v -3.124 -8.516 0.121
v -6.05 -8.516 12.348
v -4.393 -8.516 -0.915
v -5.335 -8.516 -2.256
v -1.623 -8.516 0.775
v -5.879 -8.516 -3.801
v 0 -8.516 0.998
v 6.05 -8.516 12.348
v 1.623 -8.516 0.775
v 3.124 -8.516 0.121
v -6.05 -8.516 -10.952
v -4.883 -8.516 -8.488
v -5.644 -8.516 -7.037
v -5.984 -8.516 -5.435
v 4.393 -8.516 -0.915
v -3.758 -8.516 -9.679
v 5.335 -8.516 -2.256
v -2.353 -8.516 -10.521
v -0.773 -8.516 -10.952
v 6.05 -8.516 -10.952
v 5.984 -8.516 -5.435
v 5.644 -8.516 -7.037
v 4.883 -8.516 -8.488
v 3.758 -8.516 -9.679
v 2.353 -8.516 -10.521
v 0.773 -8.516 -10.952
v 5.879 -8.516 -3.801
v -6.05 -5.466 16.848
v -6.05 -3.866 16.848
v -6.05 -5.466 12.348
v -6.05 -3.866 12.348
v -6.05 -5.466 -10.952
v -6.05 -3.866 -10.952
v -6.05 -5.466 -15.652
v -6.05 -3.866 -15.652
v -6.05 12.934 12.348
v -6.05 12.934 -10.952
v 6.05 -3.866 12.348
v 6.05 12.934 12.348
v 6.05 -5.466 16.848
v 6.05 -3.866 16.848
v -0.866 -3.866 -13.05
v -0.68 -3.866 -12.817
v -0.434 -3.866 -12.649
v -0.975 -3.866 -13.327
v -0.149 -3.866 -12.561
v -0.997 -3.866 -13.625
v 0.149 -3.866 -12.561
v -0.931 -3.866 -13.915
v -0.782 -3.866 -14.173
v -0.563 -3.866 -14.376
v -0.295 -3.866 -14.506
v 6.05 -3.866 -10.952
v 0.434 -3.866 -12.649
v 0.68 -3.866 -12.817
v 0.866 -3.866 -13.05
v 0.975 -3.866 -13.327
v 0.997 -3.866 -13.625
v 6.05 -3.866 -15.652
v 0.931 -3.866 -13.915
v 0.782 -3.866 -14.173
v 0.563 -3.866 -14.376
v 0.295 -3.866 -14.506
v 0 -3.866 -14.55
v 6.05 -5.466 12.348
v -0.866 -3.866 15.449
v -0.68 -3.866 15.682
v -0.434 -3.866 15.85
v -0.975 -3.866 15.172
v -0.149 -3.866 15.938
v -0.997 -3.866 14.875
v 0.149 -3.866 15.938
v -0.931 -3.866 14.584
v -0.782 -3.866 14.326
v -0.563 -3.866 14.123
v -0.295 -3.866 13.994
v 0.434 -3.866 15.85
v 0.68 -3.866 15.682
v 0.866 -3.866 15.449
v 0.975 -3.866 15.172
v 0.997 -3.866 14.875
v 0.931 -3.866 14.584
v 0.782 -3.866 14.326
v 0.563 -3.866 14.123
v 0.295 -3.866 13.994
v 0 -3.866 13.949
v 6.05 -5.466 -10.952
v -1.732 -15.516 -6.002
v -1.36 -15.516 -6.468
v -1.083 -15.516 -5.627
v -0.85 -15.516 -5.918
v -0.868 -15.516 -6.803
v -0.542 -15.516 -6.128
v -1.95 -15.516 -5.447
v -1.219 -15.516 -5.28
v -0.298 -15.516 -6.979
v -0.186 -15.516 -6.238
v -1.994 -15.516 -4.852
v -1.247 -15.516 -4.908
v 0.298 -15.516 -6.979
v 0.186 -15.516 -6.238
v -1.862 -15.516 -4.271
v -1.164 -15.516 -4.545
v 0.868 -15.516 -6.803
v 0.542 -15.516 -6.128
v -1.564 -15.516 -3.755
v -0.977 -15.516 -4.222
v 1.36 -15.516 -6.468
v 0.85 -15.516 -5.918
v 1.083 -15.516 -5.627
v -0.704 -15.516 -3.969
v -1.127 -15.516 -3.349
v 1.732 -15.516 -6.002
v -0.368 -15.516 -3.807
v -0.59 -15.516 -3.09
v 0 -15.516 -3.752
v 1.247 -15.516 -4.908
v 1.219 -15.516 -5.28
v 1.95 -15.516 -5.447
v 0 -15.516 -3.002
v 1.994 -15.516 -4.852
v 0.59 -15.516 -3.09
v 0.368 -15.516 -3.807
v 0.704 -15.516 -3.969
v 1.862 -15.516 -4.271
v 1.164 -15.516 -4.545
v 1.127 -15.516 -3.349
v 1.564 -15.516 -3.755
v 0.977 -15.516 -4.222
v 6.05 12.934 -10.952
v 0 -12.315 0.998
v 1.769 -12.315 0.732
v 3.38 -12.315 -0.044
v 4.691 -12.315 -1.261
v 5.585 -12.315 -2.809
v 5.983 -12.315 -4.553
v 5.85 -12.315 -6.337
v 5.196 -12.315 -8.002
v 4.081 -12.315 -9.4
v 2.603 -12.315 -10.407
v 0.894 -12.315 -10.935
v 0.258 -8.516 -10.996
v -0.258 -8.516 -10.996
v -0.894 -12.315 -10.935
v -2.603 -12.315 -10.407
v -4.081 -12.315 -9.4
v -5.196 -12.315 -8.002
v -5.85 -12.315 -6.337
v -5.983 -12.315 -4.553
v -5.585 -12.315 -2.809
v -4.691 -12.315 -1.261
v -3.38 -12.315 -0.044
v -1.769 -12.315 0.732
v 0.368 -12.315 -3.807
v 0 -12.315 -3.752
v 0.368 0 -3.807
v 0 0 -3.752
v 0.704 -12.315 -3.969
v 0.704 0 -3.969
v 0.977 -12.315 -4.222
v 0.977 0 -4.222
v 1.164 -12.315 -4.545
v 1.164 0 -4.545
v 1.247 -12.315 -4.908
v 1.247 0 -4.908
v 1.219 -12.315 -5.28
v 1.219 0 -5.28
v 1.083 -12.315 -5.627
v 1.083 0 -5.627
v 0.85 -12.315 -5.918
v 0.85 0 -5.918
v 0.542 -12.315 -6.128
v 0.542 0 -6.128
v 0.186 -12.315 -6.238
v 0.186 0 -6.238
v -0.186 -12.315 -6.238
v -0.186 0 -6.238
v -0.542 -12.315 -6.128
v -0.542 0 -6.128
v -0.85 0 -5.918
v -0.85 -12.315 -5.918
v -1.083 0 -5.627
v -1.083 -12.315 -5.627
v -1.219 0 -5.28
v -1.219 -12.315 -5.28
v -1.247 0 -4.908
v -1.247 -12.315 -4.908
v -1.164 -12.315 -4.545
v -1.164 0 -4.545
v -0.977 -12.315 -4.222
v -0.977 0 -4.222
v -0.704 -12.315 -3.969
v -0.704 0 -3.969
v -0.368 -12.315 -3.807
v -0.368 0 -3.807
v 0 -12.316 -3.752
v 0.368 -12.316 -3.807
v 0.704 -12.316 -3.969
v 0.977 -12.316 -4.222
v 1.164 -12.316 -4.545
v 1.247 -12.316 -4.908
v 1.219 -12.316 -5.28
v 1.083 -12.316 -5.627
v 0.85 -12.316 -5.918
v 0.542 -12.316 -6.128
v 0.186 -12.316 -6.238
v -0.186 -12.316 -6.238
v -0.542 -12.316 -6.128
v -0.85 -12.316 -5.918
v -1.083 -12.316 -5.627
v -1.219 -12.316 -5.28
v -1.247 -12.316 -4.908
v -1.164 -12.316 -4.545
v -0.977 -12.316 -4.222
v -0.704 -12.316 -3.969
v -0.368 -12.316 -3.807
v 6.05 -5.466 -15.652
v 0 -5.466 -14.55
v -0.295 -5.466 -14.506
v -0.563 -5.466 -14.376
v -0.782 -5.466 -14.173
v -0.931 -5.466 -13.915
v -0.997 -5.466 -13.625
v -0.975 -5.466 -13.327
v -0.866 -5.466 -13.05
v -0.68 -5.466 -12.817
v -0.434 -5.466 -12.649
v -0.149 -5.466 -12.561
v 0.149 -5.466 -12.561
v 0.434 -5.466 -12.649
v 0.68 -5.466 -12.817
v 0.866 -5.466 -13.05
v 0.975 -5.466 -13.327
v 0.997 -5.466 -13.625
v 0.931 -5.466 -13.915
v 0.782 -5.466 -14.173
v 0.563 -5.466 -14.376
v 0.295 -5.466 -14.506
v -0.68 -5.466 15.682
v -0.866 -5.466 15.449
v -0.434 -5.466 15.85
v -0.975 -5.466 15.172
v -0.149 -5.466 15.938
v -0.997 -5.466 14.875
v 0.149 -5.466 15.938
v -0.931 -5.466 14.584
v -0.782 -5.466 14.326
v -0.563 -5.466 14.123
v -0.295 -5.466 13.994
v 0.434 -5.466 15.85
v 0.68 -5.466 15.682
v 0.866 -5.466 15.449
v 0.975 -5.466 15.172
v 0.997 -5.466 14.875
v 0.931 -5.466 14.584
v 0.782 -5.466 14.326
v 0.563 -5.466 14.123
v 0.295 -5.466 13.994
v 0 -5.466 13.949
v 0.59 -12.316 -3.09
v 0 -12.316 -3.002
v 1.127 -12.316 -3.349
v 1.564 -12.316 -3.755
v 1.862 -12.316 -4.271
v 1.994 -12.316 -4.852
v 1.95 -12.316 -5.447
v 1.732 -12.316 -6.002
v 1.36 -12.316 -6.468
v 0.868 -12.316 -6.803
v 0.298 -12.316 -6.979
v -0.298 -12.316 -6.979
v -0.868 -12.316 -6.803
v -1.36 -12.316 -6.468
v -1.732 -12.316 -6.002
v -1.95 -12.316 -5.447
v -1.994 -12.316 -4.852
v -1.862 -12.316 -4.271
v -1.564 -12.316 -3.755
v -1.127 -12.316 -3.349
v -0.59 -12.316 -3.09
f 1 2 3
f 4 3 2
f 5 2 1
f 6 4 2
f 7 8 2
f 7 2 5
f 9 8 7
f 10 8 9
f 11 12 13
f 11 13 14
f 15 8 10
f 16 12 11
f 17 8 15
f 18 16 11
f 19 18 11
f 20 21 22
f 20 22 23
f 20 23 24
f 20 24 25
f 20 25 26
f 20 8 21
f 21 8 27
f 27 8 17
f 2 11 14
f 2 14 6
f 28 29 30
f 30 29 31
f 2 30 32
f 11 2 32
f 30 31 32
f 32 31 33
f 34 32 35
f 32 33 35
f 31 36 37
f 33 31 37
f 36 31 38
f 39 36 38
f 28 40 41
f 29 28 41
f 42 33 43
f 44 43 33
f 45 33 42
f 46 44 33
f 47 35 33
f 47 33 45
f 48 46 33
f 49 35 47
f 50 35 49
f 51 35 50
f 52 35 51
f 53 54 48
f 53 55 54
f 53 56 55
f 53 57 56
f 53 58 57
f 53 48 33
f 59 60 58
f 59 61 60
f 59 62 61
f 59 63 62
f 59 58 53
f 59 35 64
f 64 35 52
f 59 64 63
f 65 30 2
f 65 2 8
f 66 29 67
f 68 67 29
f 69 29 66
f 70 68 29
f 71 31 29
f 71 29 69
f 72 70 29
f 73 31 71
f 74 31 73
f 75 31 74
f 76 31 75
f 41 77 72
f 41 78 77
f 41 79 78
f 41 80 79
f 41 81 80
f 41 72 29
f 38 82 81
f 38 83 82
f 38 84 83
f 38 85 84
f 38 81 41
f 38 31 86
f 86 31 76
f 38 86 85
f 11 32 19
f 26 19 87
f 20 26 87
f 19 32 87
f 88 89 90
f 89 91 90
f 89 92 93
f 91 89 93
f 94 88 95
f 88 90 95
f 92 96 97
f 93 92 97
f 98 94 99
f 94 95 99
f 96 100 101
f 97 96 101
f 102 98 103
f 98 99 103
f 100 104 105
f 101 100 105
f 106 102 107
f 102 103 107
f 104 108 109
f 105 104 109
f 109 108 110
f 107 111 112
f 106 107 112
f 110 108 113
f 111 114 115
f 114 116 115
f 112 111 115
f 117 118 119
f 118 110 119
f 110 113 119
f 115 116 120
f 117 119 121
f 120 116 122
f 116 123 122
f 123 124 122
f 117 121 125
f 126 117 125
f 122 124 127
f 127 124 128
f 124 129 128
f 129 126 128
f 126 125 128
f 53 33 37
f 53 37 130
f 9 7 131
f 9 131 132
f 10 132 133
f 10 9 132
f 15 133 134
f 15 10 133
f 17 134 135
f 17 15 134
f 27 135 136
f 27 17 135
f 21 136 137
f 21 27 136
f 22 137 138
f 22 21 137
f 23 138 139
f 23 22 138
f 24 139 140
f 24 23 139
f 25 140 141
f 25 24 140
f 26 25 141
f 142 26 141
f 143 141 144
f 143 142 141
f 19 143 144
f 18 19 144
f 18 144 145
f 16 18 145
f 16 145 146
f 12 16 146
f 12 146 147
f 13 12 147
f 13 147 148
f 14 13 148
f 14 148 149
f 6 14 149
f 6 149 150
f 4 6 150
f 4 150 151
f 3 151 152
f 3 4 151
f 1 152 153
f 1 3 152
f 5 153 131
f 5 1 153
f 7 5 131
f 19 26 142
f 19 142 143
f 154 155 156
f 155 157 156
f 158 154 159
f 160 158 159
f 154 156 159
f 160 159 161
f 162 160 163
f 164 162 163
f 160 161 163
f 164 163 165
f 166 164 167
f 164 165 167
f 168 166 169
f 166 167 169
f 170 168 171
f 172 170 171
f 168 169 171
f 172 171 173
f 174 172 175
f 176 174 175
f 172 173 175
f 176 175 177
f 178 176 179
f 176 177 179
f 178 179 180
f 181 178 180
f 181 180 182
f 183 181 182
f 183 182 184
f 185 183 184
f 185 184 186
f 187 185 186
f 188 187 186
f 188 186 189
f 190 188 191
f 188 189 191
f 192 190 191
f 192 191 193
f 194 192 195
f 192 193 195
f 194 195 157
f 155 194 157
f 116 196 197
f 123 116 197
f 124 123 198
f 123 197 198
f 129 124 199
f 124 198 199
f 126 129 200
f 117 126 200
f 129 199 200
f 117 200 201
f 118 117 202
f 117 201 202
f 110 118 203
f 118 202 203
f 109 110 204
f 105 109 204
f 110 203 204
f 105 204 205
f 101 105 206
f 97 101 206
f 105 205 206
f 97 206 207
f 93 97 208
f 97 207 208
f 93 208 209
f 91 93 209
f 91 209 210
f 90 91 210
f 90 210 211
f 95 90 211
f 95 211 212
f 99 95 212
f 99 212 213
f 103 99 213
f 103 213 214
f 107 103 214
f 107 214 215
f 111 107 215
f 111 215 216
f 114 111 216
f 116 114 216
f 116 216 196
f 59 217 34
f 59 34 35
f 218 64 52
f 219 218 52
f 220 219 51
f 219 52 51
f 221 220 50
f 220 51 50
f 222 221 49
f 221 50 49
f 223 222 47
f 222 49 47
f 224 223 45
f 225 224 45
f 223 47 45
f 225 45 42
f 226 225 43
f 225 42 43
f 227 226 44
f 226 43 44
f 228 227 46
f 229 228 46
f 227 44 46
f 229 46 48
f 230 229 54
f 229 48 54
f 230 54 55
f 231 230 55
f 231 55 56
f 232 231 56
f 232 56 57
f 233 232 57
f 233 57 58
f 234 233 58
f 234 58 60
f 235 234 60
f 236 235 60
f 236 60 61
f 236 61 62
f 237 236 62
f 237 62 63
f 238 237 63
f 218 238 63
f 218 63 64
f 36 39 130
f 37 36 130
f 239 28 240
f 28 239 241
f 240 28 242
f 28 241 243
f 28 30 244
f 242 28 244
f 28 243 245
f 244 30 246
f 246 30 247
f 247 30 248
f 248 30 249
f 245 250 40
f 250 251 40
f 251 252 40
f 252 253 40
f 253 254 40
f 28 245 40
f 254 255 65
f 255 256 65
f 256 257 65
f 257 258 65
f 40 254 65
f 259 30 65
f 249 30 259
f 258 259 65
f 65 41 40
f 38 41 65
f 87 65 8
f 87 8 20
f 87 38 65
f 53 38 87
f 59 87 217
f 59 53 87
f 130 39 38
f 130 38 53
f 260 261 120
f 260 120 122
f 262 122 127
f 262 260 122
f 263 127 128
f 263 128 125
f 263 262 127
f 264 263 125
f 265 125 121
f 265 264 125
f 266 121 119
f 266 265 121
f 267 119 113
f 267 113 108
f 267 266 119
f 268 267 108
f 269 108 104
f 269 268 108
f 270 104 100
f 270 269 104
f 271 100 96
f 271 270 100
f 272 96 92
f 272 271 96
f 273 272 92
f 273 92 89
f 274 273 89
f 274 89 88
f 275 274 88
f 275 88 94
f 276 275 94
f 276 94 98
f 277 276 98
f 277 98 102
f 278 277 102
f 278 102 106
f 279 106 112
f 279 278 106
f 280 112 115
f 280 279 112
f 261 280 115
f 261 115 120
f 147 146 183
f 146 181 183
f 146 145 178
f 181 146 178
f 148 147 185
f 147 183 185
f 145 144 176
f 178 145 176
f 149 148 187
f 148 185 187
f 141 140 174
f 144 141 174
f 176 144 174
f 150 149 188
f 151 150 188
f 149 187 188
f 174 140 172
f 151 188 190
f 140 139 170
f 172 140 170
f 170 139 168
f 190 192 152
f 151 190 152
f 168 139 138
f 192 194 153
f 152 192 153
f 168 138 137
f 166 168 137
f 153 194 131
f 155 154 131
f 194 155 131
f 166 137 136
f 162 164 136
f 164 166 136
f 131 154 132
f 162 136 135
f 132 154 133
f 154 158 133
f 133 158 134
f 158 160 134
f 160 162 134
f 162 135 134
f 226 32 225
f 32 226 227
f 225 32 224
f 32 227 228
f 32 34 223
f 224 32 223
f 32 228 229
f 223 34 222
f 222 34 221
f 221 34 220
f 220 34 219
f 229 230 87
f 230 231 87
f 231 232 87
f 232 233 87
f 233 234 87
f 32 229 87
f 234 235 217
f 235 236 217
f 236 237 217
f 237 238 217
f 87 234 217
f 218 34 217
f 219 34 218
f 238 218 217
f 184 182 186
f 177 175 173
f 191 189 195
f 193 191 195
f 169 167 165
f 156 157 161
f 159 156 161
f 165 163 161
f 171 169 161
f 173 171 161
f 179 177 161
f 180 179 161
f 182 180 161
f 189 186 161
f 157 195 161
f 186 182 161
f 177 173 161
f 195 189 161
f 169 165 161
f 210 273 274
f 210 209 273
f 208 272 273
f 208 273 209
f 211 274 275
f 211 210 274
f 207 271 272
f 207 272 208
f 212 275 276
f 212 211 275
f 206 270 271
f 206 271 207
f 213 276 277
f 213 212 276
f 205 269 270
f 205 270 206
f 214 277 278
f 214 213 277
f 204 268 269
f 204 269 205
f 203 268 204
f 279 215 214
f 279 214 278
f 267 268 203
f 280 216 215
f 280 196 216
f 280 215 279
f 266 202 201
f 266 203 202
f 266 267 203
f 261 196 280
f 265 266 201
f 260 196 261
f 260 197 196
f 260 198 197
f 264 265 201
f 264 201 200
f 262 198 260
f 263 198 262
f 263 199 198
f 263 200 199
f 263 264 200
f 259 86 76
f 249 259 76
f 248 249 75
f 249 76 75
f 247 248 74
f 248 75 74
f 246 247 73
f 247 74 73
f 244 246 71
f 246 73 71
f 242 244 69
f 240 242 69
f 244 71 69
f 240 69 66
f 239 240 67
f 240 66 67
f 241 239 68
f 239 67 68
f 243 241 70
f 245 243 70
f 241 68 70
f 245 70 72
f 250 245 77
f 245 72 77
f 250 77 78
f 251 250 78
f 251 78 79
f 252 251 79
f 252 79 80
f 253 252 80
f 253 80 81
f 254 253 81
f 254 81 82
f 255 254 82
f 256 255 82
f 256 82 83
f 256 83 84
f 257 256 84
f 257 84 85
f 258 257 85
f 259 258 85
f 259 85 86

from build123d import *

# Parameters (mm, degrees)
SKETCH_3_W          = 32.5
SKETCH_3_H          = 21.45
EXTRUDE_1_DEPTH     = 6.05
CUT_EXTRUDE_START   = -3.86581
SKETCH_4_W          = 12.1
SKETCH_4_H          = 4.7
SKETCH_4_H_2        = 4.6
CUT_EXTRUDE_1_DEPTH = 26.951221363
CUT_EXTRUDE_START_2 = -5.46581
SKETCH_4_2_W        = 12.1
SKETCH_4_2_H        = 4.7
SKETCH_4_2_H_2      = 4.6
CUT_EXTRUDE_2_DEPTH = 17.619601363
SKETCH_5_R          = 1
CUT_EXTRUDE_3_DEPTH = 23.085411363
EXTRUDE_START       = -8.5159
SKETCH_6_R          = 6.000000077
SKETCH_6_R_2        = 1.25
EXTRUDE_2_DEPTH     = 3.7991
EXTRUDE_START_2     = -12.3159
SKETCH_6_6_R        = 1.999999968
EXTRUDE_3_DEPTH     = 3.2
SKETCH_6_7_R        = 1.25
CUT_EXTRUDE_4_DEPTH = 24.690031766


with BuildPart() as part:
    # 草图3 → 凸台-拉伸1 (new, symmetric)
    with BuildSketch(Plane(origin=(0, 0, 0), x_dir=(0, 0, -1), z_dir=(1, 0, 0))):
        with Locations((-0.5985, 2.2091)):
            Rectangle(SKETCH_3_W, SKETCH_3_H)
    extrude(amount=EXTRUDE_1_DEPTH, both=True)

    # 草图4 → 切除-拉伸1 (cut, through all)
    with BuildSketch(Plane(origin=(0, 0, 0), x_dir=(1, 0, 0), z_dir=(0, 1, 0)).offset(CUT_EXTRUDE_START)):
        with Locations((0, 13.30155)):
            Rectangle(SKETCH_4_W, SKETCH_4_H)
        with Locations((0, -14.6484)):
            Rectangle(SKETCH_4_W, SKETCH_4_H_2)
    extrude(amount=CUT_EXTRUDE_1_DEPTH, mode=Mode.SUBTRACT)

    # 草图4<2> → 切除-拉伸2 (cut, through all)
    with BuildSketch(Plane(origin=(0, 0, 0), x_dir=(1, 0, 0), z_dir=(0, 1, 0)).offset(CUT_EXTRUDE_START_2)):
        with Locations((0, 13.30155)):
            Rectangle(SKETCH_4_2_W, SKETCH_4_2_H)
        with Locations((0, -14.6484)):
            Rectangle(SKETCH_4_2_W, SKETCH_4_2_H_2)
    extrude(amount=-CUT_EXTRUDE_2_DEPTH, mode=Mode.SUBTRACT)

    # 草图5 → 切除-拉伸3 (cut, through all)
    with BuildSketch(Plane(origin=(0, 0, 0), x_dir=(1, 0, 0), z_dir=(0, 1, 0))):
        with Locations((0, 13.55)):
            Circle(SKETCH_5_R)
        with Locations((0, -14.949238683)):
            Circle(SKETCH_5_R)
    extrude(amount=-CUT_EXTRUDE_3_DEPTH, mode=Mode.SUBTRACT)

    # 草图6 → 凸台-拉伸2 (add)
    with BuildSketch(Plane(origin=(0, 0, 0), x_dir=(1, 0, 0), z_dir=(0, 1, 0)).offset(EXTRUDE_START)):
        with Locations((4.63e-07, 5.001545165)):
            Circle(SKETCH_6_R)
        with Locations((4.63e-07, 5.001545165)):
            Circle(SKETCH_6_R_2, mode=Mode.SUBTRACT)
    extrude(amount=-EXTRUDE_2_DEPTH)


with BuildPart() as body_2:
    # 草图6<6> → 凸台-拉伸3 (new body)
    with BuildSketch(Plane(origin=(0, 0, 0), x_dir=(1, 0, 0), z_dir=(0, 1, 0)).offset(EXTRUDE_START_2)):
        with Locations((4.63e-07, 5.001545165)):
            Circle(SKETCH_6_6_R)
    extrude(amount=-EXTRUDE_3_DEPTH)


with BuildPart() as cut_extrude_4_tool:
    # 草图6<7> → 切除-拉伸4 (new, through all)
    with BuildSketch(Plane(origin=(0, 0, 0), x_dir=(1, 0, 0), z_dir=(0, 1, 0))):
        with Locations((4.63e-07, 5.001545165)):
            Circle(SKETCH_6_7_R)
    extrude(amount=-CUT_EXTRUDE_4_DEPTH)


with BuildPart() as part_1:
    add(part.part)

    # 切除-拉伸4: cut by cut_extrude_4_tool
    add(cut_extrude_4_tool.part, mode=Mode.SUBTRACT)


with BuildPart() as body_2_1:
    add(body_2.part)

    # 切除-拉伸4: cut by cut_extrude_4_tool
    add(cut_extrude_4_tool.part, mode=Mode.SUBTRACT)


solid = Compound([part_1.part, body_2_1.part])
